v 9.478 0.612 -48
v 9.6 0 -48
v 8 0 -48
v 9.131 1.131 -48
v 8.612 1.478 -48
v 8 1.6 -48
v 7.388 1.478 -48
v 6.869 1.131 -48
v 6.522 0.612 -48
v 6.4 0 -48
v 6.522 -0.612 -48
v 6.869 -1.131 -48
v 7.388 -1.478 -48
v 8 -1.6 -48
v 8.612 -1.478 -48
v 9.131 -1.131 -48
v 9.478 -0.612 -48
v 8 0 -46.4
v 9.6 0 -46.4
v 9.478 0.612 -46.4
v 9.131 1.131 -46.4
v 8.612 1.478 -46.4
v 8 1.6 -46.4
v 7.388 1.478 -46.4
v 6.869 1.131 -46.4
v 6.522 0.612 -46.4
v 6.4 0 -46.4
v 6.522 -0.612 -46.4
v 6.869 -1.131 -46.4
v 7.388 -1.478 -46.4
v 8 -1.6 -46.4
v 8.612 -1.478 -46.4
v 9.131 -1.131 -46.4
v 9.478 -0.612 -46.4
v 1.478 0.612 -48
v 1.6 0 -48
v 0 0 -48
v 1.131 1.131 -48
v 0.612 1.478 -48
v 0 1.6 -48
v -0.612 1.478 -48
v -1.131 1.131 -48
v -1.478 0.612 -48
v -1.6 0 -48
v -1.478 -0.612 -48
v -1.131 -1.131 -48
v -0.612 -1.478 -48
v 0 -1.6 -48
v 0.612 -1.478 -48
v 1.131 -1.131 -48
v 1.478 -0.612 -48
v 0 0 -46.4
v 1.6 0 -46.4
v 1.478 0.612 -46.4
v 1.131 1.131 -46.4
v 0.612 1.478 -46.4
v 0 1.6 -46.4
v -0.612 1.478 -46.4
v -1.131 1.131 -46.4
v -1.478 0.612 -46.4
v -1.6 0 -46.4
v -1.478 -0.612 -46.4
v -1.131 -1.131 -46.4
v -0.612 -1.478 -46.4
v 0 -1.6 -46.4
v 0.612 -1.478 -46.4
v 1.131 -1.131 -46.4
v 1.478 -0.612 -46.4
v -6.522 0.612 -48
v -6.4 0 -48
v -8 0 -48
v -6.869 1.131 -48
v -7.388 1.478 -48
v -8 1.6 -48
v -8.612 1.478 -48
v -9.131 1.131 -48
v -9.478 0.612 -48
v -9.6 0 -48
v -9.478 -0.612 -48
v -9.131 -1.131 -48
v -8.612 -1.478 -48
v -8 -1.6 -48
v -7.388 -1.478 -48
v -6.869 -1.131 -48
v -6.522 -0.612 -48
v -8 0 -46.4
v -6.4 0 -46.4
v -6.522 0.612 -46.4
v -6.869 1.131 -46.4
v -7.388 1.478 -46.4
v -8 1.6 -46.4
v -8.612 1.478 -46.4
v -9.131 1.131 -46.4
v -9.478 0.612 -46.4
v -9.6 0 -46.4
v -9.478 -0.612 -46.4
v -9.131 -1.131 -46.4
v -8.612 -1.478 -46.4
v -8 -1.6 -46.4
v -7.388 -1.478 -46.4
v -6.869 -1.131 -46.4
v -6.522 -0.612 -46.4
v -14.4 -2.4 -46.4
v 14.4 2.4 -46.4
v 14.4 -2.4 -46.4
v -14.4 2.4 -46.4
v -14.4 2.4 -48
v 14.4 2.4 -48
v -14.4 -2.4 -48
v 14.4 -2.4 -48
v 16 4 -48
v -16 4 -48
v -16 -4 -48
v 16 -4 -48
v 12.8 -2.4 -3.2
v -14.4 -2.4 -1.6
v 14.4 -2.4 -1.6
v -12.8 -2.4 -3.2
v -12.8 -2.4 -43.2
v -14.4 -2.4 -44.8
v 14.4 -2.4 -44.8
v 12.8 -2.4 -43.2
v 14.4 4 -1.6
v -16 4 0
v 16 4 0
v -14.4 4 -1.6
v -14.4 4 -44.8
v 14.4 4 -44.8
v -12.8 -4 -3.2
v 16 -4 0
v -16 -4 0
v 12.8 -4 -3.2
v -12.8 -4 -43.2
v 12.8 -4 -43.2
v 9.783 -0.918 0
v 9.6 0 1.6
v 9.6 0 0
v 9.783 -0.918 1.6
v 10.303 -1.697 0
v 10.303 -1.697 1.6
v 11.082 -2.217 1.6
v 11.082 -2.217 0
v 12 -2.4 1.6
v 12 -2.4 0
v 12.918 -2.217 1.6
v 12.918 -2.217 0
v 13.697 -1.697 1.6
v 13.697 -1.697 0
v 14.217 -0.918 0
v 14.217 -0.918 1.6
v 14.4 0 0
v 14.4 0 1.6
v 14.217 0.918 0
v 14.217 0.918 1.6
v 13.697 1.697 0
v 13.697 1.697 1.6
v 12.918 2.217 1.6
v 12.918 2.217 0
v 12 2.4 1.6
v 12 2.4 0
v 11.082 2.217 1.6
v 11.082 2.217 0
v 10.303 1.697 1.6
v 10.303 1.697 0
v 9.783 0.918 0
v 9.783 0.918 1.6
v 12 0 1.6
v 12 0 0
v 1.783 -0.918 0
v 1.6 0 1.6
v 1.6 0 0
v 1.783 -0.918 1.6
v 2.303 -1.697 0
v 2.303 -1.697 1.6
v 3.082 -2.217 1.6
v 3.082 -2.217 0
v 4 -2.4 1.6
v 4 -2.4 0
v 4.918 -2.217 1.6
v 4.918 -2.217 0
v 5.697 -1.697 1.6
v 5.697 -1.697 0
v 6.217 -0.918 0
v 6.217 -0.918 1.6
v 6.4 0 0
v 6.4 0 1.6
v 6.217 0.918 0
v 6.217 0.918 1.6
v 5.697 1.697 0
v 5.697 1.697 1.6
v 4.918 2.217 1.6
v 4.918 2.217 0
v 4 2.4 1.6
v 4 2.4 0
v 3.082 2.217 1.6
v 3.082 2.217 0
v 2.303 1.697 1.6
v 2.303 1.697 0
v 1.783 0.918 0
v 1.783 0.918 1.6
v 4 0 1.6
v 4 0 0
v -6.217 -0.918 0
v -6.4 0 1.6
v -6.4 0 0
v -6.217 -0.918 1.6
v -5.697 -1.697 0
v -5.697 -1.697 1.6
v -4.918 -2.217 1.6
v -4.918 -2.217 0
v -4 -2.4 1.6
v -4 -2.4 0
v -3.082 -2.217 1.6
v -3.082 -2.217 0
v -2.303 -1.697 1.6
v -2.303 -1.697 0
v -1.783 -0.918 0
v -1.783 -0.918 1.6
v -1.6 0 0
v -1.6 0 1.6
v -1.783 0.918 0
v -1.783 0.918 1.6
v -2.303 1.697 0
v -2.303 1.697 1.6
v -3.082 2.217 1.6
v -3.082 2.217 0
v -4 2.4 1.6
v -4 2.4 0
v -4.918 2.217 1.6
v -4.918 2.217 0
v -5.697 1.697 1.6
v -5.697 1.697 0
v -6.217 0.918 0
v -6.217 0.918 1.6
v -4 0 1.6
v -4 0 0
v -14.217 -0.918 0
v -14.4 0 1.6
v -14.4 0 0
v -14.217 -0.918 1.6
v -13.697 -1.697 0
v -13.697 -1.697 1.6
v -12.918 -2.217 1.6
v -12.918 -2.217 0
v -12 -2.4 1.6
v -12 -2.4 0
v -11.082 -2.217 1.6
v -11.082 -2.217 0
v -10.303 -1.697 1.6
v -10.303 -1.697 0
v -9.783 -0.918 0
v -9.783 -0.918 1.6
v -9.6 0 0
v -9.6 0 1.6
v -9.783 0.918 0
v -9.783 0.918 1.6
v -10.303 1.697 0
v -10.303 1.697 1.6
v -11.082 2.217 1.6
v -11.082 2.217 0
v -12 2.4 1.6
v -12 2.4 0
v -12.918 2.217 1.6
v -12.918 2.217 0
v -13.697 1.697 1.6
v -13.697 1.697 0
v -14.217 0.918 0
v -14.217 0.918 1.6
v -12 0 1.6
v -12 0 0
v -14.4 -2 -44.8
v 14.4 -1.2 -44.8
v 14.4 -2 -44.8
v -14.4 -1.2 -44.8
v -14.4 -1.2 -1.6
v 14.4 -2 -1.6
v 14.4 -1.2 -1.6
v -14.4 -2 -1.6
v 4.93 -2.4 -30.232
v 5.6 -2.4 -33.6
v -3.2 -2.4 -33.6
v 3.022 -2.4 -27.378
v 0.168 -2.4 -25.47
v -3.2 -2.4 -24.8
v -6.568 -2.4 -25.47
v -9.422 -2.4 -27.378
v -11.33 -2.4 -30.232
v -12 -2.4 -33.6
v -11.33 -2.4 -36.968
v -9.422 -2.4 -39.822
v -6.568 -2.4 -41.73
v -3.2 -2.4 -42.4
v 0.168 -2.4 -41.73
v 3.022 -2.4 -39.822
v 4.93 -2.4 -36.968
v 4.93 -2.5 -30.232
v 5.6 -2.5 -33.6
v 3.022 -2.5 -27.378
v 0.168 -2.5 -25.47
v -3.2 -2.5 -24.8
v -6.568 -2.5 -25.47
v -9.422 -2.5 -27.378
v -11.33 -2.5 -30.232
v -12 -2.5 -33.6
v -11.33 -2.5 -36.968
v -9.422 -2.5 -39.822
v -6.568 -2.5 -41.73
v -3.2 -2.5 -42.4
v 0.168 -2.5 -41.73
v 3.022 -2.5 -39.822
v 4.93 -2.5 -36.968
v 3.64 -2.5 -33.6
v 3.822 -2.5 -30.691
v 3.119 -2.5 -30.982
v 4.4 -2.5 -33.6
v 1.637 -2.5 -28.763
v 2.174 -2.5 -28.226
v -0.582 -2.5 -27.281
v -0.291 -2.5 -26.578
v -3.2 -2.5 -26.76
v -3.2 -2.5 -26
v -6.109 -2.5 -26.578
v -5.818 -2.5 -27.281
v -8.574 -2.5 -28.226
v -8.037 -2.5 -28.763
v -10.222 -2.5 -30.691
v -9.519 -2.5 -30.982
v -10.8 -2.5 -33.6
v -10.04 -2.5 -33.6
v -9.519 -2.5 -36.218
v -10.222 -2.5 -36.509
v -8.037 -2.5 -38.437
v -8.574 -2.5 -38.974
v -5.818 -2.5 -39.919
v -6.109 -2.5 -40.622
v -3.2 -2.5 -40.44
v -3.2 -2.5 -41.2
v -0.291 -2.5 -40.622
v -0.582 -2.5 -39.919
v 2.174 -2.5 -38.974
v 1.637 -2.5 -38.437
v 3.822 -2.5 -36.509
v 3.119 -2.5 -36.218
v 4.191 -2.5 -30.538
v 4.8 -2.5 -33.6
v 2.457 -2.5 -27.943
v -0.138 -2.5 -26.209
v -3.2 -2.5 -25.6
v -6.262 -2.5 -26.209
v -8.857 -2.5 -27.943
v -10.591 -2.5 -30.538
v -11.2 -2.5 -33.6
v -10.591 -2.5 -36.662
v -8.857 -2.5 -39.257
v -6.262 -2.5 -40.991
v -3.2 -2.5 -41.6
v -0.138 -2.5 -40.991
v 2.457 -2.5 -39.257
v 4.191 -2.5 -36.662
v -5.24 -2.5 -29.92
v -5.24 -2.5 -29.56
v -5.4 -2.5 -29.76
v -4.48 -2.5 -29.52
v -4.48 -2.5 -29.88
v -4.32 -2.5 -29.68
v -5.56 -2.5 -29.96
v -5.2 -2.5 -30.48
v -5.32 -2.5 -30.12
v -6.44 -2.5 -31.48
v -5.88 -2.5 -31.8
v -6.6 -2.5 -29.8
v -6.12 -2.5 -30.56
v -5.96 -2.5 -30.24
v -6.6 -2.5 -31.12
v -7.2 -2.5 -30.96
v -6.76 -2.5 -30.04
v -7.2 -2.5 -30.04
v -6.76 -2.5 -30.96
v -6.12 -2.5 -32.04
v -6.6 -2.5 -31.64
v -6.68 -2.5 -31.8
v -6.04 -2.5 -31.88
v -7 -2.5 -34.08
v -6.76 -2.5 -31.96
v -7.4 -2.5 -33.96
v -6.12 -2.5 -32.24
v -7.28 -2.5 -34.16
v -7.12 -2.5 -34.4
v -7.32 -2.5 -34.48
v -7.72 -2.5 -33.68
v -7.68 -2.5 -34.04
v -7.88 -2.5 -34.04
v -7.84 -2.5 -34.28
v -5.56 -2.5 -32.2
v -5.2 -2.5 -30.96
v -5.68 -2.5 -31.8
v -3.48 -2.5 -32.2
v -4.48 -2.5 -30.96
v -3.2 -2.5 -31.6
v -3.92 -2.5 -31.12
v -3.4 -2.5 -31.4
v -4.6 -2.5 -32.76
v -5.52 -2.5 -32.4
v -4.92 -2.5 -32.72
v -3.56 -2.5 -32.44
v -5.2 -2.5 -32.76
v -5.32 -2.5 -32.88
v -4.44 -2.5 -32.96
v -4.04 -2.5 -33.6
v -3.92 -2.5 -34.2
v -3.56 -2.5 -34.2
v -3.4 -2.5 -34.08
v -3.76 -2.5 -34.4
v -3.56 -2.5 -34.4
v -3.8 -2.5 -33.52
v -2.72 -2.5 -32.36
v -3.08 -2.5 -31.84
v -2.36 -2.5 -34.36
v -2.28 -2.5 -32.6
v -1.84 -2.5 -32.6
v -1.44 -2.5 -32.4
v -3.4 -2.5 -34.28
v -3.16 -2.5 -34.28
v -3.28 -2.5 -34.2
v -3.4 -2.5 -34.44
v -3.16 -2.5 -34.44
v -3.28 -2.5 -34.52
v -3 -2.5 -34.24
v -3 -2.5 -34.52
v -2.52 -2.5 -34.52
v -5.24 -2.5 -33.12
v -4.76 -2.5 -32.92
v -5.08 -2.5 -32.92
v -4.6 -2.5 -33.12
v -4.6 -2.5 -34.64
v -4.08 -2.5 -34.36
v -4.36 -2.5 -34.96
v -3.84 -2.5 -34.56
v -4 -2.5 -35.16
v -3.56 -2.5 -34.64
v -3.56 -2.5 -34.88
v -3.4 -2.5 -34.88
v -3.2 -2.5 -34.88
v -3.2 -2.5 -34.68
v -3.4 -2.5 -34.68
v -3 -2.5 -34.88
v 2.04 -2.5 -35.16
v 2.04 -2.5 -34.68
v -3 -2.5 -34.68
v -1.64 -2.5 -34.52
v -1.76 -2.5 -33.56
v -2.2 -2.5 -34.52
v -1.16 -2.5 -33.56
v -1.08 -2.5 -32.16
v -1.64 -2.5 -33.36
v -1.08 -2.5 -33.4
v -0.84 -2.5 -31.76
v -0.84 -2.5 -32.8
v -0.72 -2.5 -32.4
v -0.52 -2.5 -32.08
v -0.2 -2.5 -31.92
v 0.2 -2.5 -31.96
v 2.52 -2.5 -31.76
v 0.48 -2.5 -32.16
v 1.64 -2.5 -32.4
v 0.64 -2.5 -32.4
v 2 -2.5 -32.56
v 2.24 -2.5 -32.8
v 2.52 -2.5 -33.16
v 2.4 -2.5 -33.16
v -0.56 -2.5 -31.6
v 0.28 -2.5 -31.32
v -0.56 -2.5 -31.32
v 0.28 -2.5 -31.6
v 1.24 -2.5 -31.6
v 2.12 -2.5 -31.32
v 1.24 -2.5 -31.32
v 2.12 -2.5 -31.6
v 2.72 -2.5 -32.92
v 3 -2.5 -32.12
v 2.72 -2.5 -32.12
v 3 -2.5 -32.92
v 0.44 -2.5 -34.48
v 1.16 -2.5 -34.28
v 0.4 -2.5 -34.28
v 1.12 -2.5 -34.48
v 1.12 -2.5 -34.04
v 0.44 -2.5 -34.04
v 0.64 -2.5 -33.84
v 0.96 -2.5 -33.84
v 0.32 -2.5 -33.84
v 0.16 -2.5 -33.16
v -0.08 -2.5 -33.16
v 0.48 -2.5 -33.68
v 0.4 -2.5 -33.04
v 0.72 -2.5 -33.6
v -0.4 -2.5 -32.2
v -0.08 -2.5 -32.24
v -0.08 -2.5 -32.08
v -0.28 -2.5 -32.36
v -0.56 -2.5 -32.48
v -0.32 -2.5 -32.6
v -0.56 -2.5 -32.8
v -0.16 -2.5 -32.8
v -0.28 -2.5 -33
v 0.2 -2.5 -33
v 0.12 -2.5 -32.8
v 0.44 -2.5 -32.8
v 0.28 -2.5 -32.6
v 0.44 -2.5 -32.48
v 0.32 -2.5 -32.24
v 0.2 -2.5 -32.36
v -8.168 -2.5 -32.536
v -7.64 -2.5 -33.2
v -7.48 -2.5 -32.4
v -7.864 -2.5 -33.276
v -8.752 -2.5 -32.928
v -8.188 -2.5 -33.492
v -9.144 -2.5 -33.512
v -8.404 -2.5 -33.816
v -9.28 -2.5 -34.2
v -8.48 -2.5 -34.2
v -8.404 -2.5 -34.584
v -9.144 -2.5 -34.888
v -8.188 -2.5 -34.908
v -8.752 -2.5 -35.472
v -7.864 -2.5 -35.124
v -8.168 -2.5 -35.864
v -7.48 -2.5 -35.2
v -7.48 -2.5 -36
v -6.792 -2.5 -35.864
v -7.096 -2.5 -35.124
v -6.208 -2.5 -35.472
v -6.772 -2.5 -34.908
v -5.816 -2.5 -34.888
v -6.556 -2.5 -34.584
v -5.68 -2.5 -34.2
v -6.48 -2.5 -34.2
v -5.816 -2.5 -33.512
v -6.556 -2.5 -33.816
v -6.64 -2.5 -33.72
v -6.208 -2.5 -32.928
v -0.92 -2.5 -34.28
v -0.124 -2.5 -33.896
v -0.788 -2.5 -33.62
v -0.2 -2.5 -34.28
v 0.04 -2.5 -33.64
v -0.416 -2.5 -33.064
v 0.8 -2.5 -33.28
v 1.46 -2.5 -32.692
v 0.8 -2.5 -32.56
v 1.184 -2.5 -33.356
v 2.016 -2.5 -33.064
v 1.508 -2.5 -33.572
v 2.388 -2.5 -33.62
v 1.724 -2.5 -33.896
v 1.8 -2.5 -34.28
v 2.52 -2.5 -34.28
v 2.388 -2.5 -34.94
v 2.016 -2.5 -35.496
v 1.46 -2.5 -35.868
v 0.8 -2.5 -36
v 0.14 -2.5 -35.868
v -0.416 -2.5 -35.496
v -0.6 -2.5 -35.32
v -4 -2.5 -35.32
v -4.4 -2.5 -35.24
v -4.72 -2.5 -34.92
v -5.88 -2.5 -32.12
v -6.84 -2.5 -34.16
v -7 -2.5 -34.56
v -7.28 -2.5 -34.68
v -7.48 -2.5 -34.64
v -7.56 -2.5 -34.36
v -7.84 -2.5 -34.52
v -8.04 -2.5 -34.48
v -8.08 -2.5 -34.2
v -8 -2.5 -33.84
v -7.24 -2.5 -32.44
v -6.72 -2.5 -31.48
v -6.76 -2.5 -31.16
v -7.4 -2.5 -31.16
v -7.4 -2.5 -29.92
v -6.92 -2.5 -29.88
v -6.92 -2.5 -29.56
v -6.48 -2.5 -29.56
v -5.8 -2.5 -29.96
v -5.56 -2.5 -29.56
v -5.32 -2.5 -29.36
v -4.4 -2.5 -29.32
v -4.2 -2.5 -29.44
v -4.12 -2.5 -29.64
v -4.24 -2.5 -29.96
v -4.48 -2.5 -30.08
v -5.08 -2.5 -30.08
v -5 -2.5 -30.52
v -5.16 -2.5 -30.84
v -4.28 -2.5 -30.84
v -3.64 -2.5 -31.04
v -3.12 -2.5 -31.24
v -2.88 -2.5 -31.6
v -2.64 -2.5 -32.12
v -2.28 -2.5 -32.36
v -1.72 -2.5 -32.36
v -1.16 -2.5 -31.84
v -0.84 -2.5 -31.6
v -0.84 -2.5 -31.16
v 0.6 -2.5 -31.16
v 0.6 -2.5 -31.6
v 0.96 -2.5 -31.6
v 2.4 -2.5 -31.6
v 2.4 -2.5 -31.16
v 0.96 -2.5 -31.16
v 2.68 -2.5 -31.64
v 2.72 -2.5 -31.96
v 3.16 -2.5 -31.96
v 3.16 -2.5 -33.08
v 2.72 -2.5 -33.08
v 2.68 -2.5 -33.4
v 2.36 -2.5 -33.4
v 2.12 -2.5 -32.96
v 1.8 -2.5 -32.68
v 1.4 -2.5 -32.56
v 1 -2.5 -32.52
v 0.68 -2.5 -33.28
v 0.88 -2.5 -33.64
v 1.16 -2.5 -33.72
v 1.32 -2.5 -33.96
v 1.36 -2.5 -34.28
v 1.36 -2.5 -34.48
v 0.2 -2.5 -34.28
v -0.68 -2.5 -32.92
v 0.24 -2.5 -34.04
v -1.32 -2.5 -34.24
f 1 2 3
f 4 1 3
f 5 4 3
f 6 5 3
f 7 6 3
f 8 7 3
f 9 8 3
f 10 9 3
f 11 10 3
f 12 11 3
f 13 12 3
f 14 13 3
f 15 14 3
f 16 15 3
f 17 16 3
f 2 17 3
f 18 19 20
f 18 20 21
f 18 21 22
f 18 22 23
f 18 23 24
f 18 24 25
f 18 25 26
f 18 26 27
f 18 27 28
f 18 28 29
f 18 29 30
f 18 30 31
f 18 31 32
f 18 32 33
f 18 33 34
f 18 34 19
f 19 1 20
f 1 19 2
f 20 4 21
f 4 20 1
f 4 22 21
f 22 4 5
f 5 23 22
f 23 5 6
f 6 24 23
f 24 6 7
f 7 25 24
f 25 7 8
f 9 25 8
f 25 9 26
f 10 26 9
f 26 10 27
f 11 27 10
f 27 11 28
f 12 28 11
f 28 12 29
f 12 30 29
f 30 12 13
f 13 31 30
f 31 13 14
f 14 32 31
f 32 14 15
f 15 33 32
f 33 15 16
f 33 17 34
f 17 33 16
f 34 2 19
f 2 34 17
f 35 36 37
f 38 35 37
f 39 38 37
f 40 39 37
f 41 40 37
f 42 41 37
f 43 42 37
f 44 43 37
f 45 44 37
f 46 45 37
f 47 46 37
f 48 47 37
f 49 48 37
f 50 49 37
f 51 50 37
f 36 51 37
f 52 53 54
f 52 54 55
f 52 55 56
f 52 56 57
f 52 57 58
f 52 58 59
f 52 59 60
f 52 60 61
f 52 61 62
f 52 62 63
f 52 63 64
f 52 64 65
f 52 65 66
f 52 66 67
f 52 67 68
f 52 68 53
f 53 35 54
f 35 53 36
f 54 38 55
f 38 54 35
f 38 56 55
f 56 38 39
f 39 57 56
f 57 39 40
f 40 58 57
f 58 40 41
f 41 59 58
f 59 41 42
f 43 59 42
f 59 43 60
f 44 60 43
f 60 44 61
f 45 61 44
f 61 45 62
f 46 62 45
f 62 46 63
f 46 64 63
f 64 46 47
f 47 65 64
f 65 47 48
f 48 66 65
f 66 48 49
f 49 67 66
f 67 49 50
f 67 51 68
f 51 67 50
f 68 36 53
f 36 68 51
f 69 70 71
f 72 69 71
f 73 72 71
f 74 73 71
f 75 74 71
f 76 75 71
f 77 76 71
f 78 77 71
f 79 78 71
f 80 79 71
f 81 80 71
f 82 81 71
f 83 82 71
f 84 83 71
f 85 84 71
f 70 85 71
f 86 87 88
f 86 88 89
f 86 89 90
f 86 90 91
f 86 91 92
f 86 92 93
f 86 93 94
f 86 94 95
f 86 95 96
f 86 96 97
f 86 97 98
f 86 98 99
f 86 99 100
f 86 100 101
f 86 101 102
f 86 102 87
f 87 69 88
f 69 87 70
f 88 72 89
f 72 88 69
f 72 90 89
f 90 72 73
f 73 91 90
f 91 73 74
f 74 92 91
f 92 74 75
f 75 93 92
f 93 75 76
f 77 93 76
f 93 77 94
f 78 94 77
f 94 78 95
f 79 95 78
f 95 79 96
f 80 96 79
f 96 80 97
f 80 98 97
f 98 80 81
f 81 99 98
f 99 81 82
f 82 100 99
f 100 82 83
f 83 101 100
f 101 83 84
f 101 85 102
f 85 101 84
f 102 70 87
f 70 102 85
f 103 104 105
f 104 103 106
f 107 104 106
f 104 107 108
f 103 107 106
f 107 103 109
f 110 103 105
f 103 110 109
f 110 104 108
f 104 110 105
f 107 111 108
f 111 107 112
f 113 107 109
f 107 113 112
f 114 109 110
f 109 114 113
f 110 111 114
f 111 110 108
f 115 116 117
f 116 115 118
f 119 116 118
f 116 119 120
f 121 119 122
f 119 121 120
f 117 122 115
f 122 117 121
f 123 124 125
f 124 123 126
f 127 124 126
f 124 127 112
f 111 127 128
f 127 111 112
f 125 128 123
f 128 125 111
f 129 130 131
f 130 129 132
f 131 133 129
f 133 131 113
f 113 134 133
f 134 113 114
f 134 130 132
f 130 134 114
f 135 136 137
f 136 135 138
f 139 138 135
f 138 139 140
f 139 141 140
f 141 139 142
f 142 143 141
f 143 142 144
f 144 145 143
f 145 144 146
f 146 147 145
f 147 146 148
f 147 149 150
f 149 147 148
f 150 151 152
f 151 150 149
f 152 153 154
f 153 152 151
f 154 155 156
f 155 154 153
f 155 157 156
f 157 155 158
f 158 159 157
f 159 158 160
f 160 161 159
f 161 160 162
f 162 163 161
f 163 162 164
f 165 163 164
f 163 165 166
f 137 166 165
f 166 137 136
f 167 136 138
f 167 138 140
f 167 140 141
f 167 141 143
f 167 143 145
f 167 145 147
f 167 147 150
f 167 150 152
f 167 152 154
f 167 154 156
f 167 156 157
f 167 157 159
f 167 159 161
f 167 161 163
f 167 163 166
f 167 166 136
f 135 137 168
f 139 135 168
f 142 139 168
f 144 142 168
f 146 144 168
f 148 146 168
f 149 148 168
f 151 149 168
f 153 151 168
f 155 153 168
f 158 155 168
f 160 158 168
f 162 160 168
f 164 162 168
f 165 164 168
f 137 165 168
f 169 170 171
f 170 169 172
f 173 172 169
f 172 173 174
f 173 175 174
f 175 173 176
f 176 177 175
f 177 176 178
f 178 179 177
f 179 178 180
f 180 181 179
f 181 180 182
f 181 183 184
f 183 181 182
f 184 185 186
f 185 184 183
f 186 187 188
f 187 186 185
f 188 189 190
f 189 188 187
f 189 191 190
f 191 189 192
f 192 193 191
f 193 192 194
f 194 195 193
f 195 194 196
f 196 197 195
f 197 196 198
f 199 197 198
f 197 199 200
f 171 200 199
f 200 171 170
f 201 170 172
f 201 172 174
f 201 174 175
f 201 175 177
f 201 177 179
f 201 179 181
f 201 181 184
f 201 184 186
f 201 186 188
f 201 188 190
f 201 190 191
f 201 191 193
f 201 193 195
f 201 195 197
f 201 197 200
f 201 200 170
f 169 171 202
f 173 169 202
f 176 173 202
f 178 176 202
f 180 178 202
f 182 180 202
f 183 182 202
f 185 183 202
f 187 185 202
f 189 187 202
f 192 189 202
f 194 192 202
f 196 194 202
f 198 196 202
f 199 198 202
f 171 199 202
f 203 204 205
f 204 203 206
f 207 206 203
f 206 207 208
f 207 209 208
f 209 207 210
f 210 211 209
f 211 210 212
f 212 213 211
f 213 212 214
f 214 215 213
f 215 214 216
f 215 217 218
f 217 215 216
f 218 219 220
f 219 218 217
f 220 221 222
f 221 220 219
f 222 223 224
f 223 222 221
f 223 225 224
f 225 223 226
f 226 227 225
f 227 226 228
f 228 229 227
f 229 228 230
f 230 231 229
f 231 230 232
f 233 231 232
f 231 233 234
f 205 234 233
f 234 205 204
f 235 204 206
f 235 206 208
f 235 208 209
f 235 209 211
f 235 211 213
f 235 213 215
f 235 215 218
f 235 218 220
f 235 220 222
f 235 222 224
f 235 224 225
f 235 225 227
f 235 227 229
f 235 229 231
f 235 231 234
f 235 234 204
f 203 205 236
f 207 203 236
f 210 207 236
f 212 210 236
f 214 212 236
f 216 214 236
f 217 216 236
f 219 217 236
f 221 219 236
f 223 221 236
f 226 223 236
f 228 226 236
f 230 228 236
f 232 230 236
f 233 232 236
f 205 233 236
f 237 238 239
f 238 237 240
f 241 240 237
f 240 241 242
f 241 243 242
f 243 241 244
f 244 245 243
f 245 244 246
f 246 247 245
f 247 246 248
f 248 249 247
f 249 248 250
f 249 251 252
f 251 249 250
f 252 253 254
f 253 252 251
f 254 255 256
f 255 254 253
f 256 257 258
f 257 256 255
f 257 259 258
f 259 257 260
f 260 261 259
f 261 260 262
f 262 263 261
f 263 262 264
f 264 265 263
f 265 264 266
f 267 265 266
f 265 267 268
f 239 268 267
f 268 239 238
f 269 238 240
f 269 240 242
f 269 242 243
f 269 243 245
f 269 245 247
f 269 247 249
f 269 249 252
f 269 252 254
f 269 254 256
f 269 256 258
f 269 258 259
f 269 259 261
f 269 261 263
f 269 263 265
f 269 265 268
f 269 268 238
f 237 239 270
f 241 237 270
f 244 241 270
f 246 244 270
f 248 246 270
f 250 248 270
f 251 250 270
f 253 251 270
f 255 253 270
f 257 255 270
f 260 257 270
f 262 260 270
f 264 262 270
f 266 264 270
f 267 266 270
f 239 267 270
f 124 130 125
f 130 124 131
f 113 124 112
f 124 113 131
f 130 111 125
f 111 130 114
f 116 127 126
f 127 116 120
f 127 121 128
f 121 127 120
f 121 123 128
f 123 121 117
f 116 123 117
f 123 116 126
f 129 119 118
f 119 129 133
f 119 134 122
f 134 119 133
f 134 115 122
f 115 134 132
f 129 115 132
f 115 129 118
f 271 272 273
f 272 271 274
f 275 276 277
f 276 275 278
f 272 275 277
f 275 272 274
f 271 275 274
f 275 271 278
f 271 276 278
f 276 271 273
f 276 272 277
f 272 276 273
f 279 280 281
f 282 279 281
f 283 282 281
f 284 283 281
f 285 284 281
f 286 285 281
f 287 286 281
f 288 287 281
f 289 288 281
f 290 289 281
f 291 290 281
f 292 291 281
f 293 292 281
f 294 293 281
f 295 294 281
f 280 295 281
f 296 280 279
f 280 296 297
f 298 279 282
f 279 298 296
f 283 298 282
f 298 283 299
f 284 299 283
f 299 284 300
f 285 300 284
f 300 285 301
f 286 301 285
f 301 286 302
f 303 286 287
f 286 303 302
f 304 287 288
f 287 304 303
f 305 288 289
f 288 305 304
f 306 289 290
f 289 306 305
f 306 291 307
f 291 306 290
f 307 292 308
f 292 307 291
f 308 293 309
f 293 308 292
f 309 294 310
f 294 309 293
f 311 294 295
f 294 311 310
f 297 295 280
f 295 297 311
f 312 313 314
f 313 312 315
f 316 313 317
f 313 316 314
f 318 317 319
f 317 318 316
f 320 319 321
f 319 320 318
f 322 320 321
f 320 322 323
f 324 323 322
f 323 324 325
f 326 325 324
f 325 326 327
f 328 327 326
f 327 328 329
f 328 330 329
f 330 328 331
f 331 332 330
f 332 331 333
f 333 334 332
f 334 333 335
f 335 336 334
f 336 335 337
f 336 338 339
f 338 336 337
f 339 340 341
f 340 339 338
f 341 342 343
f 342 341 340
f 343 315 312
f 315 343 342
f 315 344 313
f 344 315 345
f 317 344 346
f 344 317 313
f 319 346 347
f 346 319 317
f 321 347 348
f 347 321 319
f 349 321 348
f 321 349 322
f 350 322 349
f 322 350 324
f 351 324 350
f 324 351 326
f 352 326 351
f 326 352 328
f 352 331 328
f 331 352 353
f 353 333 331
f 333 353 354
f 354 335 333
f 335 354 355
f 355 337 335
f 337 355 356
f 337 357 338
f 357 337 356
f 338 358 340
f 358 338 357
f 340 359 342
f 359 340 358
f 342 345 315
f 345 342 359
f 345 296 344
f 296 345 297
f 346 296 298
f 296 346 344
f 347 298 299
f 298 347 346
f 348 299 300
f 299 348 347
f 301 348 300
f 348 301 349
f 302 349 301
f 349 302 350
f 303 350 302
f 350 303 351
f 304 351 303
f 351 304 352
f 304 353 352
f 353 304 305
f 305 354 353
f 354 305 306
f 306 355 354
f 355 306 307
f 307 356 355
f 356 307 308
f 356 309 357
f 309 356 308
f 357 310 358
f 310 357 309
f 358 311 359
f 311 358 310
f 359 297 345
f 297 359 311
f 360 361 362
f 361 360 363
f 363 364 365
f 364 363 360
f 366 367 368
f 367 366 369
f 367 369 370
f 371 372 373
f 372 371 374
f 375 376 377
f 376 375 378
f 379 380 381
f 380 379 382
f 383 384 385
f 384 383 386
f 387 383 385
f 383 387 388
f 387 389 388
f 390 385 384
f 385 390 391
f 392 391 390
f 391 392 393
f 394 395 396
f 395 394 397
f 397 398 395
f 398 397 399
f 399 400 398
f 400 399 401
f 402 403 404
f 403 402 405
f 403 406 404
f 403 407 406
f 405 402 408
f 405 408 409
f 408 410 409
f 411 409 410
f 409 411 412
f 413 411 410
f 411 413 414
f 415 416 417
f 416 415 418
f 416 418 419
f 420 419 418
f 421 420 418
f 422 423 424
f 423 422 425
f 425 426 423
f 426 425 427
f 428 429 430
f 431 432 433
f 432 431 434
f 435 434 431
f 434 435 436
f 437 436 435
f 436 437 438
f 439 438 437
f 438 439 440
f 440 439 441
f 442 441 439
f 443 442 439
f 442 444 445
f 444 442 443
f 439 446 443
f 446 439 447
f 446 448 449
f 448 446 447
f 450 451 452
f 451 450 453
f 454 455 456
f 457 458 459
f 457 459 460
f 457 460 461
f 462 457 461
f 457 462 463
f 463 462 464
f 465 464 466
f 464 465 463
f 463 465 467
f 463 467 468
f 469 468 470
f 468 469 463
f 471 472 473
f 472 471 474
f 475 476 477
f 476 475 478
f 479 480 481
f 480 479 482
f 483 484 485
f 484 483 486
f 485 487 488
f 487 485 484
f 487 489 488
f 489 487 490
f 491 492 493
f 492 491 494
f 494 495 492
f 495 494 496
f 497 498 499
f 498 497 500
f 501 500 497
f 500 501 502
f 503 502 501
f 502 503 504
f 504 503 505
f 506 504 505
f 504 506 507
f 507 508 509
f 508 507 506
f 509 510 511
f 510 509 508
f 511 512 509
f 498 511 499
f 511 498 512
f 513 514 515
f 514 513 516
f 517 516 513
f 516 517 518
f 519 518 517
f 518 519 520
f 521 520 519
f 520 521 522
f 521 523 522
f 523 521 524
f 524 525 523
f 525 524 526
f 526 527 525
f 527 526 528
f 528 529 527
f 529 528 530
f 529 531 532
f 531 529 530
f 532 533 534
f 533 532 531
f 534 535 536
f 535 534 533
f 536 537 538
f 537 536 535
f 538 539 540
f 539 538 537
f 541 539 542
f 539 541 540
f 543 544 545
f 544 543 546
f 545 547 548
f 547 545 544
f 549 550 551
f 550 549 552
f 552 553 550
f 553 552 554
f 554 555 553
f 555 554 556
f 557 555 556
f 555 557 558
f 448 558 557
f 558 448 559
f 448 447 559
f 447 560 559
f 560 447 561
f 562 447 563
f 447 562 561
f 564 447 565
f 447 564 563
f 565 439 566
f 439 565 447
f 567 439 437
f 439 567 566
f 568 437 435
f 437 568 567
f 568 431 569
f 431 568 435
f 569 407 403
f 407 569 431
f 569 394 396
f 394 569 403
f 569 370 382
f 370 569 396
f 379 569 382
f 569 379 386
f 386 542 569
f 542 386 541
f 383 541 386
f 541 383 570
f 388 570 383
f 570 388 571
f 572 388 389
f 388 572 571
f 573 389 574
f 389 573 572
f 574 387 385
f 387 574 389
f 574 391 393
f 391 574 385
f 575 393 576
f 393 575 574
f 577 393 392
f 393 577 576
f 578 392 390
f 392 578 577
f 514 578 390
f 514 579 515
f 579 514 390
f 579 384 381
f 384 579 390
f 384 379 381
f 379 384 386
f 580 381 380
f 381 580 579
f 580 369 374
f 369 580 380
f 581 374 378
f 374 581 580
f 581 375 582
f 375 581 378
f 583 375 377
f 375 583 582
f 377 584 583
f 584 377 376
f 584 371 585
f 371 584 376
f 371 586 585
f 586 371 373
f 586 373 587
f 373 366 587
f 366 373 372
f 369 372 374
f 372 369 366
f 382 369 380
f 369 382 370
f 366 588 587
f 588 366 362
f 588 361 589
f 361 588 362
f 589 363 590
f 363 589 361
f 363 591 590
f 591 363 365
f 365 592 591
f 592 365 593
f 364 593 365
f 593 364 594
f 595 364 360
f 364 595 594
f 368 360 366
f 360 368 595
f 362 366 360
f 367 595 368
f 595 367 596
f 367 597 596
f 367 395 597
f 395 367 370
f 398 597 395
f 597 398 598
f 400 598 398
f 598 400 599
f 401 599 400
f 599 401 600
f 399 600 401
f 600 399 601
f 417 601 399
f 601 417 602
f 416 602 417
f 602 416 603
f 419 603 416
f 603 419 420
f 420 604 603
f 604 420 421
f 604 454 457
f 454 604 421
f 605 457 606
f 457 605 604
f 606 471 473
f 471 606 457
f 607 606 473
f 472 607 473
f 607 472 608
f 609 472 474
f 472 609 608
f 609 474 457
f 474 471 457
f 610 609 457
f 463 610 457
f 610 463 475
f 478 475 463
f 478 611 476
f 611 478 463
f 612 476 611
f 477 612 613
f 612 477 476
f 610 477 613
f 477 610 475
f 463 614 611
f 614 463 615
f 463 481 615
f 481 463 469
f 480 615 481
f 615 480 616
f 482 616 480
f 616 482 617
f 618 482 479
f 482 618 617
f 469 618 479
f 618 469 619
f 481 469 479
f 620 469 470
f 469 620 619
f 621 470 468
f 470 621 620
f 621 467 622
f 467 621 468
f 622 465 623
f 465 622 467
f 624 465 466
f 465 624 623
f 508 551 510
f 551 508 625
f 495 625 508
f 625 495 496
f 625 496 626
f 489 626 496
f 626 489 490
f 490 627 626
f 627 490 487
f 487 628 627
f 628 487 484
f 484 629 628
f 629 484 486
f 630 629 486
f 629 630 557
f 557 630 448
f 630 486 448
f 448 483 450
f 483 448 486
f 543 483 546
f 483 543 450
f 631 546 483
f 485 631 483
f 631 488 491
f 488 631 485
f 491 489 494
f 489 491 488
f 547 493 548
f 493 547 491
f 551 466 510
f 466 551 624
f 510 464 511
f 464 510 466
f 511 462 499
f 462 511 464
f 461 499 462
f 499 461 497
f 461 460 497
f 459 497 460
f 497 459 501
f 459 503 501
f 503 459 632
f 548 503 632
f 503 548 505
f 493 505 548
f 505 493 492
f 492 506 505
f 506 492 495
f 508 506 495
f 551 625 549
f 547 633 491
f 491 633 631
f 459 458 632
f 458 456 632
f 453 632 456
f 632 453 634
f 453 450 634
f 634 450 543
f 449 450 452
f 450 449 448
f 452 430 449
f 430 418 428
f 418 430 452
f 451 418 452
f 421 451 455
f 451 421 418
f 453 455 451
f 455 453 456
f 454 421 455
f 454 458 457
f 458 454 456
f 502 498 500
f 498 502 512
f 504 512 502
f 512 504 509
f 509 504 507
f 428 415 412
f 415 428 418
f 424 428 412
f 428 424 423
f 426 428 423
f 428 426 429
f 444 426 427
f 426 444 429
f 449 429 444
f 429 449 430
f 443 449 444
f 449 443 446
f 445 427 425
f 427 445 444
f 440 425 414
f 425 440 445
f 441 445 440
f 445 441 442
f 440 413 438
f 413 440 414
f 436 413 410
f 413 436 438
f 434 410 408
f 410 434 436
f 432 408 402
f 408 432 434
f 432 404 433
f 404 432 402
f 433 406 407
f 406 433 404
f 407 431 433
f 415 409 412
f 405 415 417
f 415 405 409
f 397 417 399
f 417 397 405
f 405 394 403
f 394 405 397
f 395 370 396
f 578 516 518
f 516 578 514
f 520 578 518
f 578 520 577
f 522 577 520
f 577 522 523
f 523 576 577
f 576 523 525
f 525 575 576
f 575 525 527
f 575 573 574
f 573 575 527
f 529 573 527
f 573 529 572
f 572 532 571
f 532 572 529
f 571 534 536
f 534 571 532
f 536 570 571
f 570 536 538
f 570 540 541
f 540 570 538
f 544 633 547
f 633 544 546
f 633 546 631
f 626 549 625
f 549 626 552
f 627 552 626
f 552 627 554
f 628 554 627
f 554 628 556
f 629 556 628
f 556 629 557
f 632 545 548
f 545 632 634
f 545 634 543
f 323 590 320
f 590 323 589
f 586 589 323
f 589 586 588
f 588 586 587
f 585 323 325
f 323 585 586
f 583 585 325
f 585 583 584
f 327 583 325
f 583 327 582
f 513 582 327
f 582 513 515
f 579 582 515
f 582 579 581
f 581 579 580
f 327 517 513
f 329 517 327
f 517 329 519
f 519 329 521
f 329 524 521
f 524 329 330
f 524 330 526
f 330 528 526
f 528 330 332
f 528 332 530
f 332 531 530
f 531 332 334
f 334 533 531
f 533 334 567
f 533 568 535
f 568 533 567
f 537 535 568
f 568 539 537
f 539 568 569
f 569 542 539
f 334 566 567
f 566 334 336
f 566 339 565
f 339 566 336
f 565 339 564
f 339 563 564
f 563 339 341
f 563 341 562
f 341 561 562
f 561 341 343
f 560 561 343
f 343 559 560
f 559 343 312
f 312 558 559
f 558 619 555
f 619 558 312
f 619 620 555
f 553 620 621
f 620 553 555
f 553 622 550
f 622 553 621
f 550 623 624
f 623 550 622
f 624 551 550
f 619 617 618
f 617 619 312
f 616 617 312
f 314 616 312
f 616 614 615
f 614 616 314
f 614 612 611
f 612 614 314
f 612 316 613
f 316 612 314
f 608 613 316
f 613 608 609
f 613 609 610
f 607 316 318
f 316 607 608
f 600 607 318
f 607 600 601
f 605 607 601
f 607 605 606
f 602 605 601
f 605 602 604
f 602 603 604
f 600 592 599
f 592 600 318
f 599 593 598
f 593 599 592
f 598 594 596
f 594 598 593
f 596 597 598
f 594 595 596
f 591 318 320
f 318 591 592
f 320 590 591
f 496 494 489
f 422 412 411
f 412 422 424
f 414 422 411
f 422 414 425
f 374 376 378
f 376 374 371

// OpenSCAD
use <../lib.scad>
use <195985e.scad>
use <4347c01.scad>
function ldraw_lib__4347c01d02() = [
// 0 Window  1 x  4 x  5 with Fixed Glass with Blue Motorcycle and Red Circle Sticker (Complete)
// 0 Name: 4347c01d02.dat
// 0 Author: Takeshi Takahashi [RainbowDolphin]
// 0 !LDRAW_ORG Shortcut UPDATE 2024-07
// 0 !LICENSE Licensed under CC BY 4.0 : see CAreadme.txt
// 
// 0 BFC CERTIFY CCW
  [0,"BFC","CERTIFY"],
  [0,"BFC","CCW"],
// 
// 0 !CATEGORY Sticker Shortcut
// 0 !KEYWORDS Bricklink 4347pb01, Motorcycle shop, Set 6373
// 
// 0 !HISTORY 2024-08-26 [OrionP] Official Update 2024-07
// 
// 1 16 0 0 0 1 0 0 0 1 0 0 0 1 4347c01.dat
  [1,16,0,0,0,1,0,0,0,1,0,0,0,1, ldraw_lib__4347c01()],
// 1 15 -8 84 -6 1 0 0 0 0 -1 0 1 0 195985e.dat
  [1,15,-8,84,-6,1,0,0,0,0,-1,0,1,0, ldraw_lib__195985e()],
];
module ldraw_lib__4347c01d02(step=0, col=false, unit=2/5, alt=false, line=0.2, solid=!$preview)
    makepoly(ldraw_lib__4347c01d02(), step=step, col=col, unit=unit, alt=alt, line=line, solid=solid);
ldraw_lib__4347c01d02(line=0.2);
